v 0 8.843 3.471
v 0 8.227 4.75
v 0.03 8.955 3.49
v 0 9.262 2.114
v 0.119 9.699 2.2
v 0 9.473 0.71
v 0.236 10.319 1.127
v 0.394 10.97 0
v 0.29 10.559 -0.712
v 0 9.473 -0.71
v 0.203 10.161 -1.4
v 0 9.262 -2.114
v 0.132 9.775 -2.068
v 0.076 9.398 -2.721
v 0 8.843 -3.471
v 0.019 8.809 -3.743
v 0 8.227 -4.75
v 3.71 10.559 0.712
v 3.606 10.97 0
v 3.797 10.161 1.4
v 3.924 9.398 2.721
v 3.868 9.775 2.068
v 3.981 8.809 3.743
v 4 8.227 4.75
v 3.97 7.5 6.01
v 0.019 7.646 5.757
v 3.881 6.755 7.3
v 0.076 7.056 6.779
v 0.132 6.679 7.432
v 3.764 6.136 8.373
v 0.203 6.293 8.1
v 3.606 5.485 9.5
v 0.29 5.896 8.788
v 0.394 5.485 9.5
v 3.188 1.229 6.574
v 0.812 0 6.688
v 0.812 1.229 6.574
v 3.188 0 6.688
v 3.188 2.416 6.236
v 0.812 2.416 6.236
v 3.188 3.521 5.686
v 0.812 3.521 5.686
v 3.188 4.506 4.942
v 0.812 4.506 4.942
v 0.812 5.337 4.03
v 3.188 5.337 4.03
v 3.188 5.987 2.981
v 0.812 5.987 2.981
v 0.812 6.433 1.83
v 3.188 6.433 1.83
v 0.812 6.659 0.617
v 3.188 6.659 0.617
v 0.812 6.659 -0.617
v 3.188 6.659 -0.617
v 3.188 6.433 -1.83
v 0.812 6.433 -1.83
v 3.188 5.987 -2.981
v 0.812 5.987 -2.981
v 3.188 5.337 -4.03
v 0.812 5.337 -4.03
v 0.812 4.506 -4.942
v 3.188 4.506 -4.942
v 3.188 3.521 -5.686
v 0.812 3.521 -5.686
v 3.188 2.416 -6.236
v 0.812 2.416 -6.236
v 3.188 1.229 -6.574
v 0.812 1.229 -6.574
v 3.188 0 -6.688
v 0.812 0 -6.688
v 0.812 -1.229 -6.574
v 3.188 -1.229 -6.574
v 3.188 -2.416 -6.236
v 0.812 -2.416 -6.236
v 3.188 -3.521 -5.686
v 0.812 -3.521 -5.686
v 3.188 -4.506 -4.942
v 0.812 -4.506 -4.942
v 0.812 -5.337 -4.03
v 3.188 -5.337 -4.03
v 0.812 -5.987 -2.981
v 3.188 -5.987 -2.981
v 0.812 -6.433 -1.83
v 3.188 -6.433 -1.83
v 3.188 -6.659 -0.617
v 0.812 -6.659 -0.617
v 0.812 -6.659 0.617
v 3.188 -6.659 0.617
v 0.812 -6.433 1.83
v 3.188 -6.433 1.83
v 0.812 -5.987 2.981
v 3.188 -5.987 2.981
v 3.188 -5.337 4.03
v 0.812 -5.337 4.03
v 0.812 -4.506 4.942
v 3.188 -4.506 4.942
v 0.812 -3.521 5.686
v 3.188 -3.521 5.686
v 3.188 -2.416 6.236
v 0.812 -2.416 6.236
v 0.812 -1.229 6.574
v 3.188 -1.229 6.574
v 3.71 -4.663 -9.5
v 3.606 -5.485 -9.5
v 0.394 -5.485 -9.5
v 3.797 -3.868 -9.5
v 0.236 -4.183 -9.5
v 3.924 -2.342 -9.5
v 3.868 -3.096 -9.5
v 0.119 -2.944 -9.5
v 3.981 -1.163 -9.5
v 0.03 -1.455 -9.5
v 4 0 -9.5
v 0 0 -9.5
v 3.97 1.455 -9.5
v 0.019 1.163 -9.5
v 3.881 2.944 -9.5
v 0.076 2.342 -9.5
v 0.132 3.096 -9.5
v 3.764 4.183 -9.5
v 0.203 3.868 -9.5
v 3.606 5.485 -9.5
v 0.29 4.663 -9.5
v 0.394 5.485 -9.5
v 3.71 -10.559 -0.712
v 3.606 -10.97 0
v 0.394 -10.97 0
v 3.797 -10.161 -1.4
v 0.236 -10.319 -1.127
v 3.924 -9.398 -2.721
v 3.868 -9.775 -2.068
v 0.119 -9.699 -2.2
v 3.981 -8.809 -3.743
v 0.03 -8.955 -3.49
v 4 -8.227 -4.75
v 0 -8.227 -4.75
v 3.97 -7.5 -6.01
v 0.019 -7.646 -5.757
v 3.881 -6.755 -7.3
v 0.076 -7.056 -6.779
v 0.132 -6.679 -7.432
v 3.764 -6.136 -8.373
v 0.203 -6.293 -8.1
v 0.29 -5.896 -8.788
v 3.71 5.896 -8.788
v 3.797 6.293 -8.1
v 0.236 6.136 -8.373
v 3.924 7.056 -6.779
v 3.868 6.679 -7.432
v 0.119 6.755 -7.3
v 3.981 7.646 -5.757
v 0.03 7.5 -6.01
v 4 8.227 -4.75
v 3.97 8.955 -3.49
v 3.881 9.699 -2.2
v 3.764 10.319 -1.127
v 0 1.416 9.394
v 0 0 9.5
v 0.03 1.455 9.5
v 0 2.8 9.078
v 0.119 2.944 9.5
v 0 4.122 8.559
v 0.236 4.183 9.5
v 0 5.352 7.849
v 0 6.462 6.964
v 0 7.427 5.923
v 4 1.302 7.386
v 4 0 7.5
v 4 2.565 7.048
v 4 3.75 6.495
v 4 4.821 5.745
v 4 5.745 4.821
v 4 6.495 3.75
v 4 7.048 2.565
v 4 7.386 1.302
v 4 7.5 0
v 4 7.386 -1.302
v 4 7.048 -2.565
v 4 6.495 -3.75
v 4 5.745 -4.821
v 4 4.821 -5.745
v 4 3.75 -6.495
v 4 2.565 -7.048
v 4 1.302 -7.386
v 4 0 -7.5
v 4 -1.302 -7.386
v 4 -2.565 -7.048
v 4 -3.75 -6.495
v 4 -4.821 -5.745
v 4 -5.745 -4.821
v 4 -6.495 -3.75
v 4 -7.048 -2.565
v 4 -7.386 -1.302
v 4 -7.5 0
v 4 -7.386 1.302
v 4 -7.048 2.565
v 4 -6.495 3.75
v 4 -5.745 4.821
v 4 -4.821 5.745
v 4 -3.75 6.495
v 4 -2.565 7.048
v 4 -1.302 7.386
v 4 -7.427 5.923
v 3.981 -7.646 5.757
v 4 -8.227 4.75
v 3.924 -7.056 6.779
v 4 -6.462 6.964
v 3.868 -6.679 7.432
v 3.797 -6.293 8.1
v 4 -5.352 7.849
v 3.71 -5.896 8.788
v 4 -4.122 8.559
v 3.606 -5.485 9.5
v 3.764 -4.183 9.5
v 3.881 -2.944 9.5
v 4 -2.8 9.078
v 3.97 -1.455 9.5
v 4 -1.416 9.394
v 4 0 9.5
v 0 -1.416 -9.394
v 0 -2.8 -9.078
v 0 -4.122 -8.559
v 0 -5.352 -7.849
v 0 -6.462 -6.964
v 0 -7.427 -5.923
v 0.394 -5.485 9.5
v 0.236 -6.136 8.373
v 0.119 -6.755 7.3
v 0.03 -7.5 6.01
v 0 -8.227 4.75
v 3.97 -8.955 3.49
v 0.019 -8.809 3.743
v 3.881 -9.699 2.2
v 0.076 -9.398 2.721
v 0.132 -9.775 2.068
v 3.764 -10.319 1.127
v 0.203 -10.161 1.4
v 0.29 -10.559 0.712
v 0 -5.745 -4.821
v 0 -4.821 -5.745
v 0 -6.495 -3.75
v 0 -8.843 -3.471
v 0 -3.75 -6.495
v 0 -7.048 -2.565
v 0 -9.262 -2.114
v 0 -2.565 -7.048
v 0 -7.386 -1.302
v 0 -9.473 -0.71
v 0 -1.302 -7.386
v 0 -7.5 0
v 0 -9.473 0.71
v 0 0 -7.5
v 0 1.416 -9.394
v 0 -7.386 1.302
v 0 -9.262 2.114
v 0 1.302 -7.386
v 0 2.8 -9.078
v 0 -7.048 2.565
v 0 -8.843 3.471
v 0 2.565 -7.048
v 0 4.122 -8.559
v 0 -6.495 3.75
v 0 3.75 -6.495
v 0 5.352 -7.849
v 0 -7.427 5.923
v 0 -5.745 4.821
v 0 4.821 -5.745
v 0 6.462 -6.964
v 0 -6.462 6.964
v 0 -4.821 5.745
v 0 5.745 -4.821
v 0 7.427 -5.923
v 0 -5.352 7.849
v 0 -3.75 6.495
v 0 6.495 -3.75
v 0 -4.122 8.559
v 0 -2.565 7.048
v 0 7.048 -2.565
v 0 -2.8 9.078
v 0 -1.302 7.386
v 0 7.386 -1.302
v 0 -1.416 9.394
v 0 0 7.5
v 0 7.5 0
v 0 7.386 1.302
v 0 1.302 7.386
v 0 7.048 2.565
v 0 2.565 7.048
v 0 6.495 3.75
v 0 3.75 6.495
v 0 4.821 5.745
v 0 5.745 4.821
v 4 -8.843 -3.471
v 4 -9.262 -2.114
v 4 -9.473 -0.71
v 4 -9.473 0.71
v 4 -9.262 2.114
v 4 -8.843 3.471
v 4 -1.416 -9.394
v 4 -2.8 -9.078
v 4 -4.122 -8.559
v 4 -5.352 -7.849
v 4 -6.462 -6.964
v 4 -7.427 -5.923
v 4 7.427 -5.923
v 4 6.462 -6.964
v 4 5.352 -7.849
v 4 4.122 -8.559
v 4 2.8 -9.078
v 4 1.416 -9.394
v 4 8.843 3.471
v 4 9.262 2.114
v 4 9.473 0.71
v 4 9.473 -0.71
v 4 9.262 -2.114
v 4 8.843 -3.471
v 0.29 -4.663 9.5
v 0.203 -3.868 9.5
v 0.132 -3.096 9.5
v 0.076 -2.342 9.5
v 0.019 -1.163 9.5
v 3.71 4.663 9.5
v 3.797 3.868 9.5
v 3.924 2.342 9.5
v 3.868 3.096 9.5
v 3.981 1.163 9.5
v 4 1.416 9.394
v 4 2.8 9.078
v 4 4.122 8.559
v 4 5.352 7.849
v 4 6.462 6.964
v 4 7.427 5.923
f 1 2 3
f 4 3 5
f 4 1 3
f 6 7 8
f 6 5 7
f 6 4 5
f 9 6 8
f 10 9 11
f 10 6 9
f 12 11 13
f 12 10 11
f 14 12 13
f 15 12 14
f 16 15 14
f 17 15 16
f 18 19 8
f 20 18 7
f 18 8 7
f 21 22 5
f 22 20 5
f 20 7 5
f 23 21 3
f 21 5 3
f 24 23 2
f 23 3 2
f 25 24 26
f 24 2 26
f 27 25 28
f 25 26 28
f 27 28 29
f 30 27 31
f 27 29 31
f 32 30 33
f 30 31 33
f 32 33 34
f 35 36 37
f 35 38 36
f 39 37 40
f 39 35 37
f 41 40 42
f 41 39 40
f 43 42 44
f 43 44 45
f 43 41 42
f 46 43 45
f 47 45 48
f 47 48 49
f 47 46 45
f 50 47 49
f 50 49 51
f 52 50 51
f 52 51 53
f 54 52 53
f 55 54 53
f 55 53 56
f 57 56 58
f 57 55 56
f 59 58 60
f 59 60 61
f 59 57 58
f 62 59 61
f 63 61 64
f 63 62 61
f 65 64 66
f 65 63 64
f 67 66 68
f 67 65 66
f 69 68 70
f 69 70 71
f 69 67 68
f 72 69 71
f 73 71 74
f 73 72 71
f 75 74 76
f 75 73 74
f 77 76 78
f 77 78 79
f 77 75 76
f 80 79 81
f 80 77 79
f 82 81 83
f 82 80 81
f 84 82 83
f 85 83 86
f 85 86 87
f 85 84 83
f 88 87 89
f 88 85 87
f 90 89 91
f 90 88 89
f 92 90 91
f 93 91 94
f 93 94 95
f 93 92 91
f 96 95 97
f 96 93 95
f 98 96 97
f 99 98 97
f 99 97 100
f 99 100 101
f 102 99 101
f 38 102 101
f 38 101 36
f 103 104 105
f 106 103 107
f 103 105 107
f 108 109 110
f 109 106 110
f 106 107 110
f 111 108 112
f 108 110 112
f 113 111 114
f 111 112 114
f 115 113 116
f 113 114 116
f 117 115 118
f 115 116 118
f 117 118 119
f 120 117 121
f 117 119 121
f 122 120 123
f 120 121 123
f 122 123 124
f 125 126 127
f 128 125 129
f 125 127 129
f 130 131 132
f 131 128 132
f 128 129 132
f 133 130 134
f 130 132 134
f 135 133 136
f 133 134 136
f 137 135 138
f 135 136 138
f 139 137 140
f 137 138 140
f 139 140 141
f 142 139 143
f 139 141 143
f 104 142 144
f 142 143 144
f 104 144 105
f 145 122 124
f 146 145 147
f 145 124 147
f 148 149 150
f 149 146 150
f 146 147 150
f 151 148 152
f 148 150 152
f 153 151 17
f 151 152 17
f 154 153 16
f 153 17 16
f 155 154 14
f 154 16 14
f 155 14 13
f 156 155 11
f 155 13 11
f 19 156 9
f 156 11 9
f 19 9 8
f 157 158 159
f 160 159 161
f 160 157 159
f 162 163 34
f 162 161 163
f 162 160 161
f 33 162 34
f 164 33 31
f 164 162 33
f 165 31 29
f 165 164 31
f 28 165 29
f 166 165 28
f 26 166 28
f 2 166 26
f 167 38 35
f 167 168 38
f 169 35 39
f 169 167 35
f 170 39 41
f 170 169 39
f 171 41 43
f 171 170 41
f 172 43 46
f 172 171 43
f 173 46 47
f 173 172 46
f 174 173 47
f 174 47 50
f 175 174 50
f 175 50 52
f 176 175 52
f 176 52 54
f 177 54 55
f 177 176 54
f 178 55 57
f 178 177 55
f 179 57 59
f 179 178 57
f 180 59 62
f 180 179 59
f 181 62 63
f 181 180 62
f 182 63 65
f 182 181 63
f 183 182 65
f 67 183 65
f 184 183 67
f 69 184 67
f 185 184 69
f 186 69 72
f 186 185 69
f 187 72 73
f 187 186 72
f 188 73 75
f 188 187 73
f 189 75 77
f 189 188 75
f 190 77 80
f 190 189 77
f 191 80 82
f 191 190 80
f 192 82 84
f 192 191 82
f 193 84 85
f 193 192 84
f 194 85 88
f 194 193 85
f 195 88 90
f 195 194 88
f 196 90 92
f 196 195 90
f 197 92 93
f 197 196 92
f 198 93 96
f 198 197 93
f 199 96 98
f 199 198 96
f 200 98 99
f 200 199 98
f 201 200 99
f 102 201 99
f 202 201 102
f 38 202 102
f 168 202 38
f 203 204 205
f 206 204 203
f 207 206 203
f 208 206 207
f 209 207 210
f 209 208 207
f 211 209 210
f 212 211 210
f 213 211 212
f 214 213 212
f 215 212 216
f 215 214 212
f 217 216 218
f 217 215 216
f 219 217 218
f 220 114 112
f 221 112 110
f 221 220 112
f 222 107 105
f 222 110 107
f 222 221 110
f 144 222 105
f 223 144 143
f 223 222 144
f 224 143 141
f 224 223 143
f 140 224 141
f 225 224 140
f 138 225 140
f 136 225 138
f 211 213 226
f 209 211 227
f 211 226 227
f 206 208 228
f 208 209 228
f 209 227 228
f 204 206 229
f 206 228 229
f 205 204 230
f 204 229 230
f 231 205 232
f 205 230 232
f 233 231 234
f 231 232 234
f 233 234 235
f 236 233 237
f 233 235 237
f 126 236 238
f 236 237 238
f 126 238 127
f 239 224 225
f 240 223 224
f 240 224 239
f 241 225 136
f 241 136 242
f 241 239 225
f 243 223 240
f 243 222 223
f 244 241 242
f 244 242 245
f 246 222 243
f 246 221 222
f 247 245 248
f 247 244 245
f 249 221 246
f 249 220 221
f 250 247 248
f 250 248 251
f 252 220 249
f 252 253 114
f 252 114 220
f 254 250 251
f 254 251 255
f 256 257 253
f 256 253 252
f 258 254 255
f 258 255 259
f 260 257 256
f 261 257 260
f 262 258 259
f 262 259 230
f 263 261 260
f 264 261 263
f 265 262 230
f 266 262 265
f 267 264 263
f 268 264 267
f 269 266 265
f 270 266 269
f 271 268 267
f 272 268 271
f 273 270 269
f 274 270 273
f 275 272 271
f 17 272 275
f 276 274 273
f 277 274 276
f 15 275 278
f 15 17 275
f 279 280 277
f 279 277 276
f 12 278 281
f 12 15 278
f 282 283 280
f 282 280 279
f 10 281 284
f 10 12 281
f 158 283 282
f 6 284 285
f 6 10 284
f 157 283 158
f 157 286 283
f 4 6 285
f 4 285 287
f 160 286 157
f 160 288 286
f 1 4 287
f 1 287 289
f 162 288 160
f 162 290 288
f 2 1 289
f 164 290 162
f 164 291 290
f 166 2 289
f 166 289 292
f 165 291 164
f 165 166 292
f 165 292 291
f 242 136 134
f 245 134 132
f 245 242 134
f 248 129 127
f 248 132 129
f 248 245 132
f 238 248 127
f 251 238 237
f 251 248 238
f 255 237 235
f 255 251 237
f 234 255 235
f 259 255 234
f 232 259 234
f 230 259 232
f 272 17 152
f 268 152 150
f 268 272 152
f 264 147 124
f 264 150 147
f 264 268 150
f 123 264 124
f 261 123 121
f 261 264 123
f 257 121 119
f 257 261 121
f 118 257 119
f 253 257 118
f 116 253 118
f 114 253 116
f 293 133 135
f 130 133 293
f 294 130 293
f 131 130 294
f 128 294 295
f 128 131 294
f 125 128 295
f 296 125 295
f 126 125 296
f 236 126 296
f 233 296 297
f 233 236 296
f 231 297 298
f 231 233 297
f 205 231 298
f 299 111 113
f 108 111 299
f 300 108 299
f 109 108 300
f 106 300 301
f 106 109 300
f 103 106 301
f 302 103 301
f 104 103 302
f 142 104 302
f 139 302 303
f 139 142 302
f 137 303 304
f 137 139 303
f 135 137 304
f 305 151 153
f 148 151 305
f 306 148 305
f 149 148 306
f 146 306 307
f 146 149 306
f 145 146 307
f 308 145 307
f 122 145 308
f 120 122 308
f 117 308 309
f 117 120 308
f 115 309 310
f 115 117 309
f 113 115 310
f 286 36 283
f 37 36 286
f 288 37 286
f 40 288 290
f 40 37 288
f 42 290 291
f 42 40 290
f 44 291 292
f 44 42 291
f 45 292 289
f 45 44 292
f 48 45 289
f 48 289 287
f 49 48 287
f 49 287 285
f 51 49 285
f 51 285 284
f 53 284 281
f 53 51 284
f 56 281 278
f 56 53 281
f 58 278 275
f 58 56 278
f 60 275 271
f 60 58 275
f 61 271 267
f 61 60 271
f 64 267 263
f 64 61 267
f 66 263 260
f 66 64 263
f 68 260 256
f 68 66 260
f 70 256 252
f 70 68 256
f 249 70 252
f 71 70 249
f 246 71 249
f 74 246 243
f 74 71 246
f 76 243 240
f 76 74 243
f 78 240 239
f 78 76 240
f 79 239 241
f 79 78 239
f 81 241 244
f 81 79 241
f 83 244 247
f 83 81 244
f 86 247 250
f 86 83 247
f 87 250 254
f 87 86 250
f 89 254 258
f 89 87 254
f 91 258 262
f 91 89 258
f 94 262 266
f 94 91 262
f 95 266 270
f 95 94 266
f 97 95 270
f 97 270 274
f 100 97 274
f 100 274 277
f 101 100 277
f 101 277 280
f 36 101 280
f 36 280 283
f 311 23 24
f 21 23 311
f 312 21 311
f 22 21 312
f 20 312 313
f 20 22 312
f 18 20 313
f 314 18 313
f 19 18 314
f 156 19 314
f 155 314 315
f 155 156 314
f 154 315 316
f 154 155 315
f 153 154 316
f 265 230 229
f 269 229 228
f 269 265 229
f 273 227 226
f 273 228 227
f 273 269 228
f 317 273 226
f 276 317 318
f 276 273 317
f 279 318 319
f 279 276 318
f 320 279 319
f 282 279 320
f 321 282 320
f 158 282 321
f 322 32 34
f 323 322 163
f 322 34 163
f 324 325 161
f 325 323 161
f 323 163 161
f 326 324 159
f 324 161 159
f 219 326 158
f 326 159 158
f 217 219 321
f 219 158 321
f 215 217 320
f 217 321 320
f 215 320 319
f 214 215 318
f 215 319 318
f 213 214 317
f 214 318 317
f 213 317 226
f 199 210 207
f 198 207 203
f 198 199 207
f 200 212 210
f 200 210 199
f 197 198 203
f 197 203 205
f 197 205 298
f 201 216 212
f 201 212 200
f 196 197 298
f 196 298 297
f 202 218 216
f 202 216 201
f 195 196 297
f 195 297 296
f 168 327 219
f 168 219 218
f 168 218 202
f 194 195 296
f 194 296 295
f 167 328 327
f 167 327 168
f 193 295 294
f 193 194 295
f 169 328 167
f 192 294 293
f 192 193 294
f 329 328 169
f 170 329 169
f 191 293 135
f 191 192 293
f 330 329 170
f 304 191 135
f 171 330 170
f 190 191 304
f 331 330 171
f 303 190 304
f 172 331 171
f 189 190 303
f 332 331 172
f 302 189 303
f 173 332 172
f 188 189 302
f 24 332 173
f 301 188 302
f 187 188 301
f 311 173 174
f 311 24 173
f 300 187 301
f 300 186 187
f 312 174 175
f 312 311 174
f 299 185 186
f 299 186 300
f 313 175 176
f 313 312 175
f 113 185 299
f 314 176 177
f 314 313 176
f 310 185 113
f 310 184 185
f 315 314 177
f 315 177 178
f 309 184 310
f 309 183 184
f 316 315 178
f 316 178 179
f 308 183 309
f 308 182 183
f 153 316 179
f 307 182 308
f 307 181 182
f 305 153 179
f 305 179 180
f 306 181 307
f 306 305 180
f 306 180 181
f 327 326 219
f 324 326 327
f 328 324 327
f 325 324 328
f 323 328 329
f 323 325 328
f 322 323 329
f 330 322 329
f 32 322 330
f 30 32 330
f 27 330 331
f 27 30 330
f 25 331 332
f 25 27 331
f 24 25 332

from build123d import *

# Parameters (mm, degrees)
SKETCH_2_R          = 40
CUT_EXTRUDE_1_DEPTH = 4


with BuildPart() as part:
    # 草图1 → 旋转1 (revolve)
    with BuildSketch(Plane.XY, mode=Mode.PRIVATE) as revolve_1_sk:
        Polygon((0, 9.5), (0, 7.5), (0.812, 6.688), (3.188, 6.688), (4, 7.5), (4, 9.5), (2.472689603, 15.2), (1.527310397, 15.2), align=None)
    revolve(revolve_1_sk.sketch.rotate(Axis((4, 0, 0), (-1, 0, 0)), 270), axis=Axis((4, 0, 0), (-1, 0, 0)))

    # 草图2 → 切除-拉伸1 (cut)
    with BuildSketch(Plane(origin=(0, 0, 0), x_dir=(0, 0, -1), z_dir=(1, 0, 0))):
        Circle(SKETCH_2_R)
        Polygon((-9.5, -5.484827557), (0, -10.969655115), (9.5, -5.484827557), (9.5, 5.484827557), (0, 10.969655115), (-9.5, 5.484827557), align=None, mode=Mode.SUBTRACT)
    extrude(amount=CUT_EXTRUDE_1_DEPTH, mode=Mode.SUBTRACT)


solid = part.part
